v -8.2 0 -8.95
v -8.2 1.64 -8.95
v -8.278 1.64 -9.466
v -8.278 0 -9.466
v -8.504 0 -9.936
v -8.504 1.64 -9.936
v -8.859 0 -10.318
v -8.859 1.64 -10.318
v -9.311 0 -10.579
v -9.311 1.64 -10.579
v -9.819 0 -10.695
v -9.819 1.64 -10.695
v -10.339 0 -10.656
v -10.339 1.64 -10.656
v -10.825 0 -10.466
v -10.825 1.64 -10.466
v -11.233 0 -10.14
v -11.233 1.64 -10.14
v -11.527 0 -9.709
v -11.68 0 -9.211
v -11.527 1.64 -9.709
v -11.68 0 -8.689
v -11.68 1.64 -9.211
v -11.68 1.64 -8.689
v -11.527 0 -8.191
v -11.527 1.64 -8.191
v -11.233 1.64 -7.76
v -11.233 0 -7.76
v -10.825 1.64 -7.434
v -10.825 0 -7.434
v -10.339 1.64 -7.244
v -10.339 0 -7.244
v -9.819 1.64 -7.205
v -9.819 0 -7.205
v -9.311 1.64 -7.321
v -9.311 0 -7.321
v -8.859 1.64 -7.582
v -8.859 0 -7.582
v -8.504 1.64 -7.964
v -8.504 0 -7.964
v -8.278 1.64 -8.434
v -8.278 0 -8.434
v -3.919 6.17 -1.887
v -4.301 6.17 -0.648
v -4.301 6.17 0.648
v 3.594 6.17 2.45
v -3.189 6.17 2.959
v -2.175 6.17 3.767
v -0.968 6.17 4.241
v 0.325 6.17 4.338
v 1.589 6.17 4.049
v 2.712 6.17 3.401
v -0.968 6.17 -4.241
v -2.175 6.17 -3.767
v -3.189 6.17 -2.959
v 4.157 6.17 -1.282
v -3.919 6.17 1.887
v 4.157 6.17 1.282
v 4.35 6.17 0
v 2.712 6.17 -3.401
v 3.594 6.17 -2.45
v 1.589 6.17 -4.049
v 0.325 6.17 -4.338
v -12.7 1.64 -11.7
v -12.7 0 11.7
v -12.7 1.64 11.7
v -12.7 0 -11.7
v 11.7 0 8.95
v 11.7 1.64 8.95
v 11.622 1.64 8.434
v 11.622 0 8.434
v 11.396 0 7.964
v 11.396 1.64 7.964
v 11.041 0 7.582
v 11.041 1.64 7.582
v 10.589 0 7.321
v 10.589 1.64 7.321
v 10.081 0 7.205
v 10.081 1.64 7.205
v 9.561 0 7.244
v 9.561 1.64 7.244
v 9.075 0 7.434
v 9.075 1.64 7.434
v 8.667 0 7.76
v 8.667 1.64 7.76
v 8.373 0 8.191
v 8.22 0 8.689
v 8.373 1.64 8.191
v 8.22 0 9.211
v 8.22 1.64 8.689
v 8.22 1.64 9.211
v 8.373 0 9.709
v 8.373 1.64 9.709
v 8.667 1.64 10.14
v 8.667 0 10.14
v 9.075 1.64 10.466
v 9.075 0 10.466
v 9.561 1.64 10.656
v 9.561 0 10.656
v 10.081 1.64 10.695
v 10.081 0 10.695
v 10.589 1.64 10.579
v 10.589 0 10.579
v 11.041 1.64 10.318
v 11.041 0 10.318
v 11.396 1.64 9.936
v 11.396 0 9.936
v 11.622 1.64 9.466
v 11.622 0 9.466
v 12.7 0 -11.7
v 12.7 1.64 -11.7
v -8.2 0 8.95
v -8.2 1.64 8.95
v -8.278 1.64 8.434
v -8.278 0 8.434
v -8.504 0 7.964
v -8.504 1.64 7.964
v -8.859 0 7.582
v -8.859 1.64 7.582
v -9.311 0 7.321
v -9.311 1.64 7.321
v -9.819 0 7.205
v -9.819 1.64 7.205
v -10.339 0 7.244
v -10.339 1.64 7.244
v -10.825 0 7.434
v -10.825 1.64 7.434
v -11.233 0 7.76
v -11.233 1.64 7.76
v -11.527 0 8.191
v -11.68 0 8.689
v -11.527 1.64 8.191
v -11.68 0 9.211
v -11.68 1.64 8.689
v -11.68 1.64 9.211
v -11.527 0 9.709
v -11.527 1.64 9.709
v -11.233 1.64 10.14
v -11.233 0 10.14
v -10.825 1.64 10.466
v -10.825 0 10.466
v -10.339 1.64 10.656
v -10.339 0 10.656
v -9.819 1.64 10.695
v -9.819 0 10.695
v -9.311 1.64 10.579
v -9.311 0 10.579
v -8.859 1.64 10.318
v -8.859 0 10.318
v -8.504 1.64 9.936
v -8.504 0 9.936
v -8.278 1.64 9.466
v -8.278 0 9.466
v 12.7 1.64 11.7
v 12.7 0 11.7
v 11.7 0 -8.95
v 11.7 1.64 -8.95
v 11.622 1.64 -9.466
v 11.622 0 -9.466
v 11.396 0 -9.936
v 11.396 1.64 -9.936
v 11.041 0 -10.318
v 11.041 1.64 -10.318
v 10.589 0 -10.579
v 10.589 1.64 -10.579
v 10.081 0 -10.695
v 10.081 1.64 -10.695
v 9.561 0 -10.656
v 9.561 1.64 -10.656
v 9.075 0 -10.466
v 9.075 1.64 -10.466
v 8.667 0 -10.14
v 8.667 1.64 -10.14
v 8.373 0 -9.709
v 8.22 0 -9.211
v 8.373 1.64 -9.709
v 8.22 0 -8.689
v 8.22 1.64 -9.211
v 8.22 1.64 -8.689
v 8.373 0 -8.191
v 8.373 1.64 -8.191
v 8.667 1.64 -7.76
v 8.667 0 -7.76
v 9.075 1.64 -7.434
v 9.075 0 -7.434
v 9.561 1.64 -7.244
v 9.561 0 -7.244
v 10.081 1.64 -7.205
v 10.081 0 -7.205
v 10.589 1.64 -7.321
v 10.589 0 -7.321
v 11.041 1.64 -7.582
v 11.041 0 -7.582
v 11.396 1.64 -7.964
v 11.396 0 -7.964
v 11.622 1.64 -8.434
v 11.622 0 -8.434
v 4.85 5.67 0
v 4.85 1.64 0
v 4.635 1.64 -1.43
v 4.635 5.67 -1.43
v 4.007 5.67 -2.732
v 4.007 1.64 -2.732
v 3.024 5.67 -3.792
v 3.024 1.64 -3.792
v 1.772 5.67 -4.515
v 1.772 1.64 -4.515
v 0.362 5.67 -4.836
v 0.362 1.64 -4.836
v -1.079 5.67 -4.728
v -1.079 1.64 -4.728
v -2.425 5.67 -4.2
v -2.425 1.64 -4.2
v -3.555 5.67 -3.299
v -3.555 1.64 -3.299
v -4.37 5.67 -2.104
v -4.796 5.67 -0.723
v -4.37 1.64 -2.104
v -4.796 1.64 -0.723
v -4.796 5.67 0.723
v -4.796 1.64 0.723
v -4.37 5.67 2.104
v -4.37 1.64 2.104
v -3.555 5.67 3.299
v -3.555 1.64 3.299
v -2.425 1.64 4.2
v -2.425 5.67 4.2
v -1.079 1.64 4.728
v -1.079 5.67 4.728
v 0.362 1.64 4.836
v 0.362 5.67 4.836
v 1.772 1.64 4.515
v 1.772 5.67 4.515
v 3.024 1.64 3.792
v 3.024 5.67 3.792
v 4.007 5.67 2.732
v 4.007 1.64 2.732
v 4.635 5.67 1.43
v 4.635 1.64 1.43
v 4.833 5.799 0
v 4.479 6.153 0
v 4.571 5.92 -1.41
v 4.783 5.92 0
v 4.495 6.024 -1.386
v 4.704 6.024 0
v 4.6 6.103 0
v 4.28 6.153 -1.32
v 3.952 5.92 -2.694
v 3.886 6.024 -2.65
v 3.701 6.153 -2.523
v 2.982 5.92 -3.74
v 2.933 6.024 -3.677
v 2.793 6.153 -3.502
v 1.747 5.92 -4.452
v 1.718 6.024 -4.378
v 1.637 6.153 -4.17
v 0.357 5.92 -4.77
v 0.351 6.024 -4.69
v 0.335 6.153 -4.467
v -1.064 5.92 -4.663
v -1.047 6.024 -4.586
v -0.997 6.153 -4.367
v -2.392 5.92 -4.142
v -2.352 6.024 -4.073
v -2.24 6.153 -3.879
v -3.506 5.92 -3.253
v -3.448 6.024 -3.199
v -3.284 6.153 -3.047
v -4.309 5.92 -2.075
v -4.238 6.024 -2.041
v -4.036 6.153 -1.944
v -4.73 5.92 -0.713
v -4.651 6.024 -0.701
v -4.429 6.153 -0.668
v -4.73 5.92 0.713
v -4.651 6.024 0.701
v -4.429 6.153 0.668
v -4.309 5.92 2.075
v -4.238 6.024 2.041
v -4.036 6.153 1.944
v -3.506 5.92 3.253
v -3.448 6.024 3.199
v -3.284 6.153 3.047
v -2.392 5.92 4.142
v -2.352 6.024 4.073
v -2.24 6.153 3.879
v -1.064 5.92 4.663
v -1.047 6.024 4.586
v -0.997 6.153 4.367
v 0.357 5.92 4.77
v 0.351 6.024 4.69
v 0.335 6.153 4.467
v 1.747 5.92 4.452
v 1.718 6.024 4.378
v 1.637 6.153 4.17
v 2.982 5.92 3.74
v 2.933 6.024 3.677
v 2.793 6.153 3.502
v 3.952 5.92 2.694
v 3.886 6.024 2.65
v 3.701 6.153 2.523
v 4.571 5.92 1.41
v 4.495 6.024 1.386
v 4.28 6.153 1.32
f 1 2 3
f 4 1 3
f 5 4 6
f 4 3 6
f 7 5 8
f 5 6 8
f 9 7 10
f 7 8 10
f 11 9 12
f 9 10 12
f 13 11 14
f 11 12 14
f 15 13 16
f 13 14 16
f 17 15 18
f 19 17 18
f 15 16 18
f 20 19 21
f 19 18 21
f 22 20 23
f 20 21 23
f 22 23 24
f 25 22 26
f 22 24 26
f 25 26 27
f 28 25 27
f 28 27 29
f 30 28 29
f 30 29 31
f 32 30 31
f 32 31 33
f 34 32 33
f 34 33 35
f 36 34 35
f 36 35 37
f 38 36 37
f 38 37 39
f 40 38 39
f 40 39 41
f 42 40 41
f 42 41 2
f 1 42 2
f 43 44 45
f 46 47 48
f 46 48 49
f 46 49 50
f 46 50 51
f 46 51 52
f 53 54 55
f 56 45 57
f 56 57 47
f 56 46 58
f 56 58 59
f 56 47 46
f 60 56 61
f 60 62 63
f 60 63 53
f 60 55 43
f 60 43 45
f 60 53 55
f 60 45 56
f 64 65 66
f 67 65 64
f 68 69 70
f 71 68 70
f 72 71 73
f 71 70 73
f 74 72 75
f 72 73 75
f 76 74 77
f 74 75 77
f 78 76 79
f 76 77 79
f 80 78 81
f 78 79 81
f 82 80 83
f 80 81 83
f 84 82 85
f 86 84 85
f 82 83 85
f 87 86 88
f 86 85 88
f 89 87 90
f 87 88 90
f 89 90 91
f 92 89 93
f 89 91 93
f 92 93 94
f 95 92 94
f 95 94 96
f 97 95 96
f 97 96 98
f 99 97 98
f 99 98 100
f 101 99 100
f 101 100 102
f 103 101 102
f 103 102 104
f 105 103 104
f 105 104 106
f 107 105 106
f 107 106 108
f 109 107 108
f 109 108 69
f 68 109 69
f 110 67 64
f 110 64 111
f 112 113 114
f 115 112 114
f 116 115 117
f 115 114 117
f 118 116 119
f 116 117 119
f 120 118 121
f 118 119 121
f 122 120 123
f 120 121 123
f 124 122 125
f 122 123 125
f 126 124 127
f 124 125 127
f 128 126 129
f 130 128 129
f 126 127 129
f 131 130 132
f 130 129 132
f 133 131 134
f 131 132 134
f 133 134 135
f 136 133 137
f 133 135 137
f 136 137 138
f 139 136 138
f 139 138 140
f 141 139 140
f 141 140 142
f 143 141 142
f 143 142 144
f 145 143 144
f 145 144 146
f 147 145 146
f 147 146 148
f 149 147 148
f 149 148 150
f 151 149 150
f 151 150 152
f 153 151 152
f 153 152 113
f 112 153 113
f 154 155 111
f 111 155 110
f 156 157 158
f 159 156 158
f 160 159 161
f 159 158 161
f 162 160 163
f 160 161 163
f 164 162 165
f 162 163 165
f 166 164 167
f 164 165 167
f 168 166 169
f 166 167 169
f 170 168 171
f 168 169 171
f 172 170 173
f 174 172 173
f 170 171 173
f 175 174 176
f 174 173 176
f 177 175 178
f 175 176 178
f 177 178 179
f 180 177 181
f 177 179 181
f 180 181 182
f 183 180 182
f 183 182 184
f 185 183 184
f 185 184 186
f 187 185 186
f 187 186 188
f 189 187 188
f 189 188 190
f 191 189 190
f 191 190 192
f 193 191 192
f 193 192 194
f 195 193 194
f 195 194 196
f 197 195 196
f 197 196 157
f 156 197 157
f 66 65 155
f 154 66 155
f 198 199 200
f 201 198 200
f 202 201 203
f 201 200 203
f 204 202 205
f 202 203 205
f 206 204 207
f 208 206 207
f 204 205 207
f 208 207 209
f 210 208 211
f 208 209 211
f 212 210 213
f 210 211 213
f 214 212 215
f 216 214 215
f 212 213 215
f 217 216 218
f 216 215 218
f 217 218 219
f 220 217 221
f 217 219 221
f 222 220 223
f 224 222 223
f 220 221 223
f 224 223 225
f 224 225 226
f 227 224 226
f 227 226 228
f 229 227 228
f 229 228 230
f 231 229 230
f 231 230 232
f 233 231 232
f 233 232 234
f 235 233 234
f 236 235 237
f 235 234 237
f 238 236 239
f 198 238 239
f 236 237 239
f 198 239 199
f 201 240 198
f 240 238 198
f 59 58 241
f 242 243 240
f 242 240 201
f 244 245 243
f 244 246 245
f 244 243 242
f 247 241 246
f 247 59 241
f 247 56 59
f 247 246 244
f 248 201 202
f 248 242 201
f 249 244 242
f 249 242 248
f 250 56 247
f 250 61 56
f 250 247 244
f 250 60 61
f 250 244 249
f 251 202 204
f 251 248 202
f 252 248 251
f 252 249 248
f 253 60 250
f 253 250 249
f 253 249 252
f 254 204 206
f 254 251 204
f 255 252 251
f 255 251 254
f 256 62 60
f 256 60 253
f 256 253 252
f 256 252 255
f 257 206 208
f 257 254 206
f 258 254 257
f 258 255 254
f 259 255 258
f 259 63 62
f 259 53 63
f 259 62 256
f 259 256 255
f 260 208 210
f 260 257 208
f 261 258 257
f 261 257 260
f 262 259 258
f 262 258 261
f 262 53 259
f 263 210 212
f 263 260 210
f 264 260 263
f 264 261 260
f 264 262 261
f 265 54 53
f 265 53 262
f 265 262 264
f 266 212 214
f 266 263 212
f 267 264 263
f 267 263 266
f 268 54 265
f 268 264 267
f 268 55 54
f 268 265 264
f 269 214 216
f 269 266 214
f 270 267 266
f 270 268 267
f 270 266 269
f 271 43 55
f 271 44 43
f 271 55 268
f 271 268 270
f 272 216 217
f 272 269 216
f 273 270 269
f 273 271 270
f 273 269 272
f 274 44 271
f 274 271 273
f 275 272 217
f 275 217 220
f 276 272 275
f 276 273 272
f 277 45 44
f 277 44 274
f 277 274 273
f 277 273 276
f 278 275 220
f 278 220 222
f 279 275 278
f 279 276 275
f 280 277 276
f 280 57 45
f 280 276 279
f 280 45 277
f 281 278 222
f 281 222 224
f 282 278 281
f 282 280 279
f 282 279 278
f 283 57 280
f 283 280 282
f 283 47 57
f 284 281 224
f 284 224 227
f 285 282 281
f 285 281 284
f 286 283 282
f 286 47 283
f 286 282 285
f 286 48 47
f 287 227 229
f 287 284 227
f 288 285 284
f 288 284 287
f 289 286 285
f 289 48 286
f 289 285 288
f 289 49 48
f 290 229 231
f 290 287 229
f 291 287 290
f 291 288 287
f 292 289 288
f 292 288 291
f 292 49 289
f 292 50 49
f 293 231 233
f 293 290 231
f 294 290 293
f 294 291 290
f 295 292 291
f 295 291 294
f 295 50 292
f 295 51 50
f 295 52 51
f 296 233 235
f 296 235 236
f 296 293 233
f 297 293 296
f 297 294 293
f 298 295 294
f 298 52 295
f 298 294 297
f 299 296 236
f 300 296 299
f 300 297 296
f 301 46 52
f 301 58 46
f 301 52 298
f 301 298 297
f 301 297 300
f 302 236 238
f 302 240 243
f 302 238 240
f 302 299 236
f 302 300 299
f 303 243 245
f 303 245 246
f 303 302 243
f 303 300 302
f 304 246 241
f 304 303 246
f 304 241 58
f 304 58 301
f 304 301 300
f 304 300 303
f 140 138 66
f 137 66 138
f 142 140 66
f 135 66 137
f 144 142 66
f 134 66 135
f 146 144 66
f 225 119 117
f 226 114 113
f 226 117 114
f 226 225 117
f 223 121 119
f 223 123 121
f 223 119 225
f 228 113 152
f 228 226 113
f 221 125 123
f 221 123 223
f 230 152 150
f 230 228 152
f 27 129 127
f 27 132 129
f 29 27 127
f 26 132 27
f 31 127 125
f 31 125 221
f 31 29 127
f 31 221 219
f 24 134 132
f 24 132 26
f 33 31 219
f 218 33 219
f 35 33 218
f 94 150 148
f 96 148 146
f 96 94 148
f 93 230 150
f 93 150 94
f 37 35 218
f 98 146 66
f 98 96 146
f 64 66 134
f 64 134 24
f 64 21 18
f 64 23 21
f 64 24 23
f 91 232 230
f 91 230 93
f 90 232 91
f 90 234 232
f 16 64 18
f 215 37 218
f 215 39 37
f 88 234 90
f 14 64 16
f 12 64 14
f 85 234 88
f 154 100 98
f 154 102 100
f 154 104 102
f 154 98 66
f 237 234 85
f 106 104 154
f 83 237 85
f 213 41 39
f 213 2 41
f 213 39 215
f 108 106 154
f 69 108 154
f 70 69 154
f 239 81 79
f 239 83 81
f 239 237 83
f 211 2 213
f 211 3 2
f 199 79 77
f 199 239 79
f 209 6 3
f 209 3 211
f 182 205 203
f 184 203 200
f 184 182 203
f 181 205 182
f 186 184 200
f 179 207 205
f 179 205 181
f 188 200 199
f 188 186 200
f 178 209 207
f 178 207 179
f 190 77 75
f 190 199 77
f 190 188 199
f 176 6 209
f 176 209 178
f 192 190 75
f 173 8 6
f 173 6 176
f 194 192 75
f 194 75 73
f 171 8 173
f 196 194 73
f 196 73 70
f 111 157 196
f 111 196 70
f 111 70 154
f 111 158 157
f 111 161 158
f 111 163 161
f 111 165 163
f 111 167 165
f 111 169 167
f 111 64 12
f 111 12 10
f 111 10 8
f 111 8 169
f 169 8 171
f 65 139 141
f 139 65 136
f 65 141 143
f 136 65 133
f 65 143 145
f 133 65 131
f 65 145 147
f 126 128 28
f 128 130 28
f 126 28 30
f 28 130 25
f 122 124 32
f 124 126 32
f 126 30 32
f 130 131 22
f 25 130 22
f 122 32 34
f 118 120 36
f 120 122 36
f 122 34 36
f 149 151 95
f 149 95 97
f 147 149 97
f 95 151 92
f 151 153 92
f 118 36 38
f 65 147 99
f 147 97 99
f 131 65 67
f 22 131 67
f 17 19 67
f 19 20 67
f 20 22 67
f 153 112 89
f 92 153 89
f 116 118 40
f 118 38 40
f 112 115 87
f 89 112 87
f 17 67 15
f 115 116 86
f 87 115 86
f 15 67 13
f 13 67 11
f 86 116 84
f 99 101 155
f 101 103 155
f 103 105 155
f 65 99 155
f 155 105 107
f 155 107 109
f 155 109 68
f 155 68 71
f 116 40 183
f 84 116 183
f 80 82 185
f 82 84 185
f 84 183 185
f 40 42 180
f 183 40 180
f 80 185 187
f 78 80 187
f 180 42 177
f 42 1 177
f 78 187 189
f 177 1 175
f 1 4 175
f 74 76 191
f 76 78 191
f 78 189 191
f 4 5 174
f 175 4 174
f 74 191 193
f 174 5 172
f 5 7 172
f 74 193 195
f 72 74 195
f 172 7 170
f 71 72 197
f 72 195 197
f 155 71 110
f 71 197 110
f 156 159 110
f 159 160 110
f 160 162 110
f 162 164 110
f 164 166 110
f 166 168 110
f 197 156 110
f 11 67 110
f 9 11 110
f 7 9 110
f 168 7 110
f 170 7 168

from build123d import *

# Parameters (mm, degrees)
SKETCH1_W           = 25.4
SKETCH1_H           = 23.4
BOSS_EXTRUDE1_DEPTH = 1.64
SKETCH2_R           = 1.75
CUT_EXTRUDE1_DEPTH  = 2.64
SKETCH3_R           = 4.85
BOSS_EXTRUDE2_DEPTH = 4.53
FILLET1_R           = 0.5


with BuildPart() as part:
    # Sketch1 → Boss-Extrude1 (new body)
    with BuildSketch(Plane(origin=(0, 0, 0), x_dir=(1, 0, 0), z_dir=(0, 1, 0))):
        Rectangle(SKETCH1_W, SKETCH1_H)
    extrude(amount=BOSS_EXTRUDE1_DEPTH)

    # Sketch2 → Cut-Extrude1 (cut, through all)
    with BuildSketch(Plane(origin=(0, 1.64, 0), x_dir=(1, 0, 0), z_dir=(0, 1, 0))):
        with Locations((-9.95, -8.95)):
            Circle(SKETCH2_R)
        with Locations((9.95, -8.95)):
            Circle(SKETCH2_R)
        with Locations((9.95, 8.95)):
            Circle(SKETCH2_R)
        with Locations((-9.95, 8.95)):
            Circle(SKETCH2_R)
    extrude(amount=-CUT_EXTRUDE1_DEPTH, mode=Mode.SUBTRACT)

    # Sketch3 → Boss-Extrude2 (add)
    with BuildSketch(Plane(origin=(0, 1.64, 0), x_dir=(1, 0, 0), z_dir=(0, 1, 0))):
        Circle(SKETCH3_R)
    extrude(amount=BOSS_EXTRUDE2_DEPTH)

    # Fillet1
    fillet1_edges = [part.edges().sort_by_distance(p)[0] for p in [
        (-4.85, 6.17, 0),
    ]]
    fillet(fillet1_edges, radius=FILLET1_R)


solid = part.part
